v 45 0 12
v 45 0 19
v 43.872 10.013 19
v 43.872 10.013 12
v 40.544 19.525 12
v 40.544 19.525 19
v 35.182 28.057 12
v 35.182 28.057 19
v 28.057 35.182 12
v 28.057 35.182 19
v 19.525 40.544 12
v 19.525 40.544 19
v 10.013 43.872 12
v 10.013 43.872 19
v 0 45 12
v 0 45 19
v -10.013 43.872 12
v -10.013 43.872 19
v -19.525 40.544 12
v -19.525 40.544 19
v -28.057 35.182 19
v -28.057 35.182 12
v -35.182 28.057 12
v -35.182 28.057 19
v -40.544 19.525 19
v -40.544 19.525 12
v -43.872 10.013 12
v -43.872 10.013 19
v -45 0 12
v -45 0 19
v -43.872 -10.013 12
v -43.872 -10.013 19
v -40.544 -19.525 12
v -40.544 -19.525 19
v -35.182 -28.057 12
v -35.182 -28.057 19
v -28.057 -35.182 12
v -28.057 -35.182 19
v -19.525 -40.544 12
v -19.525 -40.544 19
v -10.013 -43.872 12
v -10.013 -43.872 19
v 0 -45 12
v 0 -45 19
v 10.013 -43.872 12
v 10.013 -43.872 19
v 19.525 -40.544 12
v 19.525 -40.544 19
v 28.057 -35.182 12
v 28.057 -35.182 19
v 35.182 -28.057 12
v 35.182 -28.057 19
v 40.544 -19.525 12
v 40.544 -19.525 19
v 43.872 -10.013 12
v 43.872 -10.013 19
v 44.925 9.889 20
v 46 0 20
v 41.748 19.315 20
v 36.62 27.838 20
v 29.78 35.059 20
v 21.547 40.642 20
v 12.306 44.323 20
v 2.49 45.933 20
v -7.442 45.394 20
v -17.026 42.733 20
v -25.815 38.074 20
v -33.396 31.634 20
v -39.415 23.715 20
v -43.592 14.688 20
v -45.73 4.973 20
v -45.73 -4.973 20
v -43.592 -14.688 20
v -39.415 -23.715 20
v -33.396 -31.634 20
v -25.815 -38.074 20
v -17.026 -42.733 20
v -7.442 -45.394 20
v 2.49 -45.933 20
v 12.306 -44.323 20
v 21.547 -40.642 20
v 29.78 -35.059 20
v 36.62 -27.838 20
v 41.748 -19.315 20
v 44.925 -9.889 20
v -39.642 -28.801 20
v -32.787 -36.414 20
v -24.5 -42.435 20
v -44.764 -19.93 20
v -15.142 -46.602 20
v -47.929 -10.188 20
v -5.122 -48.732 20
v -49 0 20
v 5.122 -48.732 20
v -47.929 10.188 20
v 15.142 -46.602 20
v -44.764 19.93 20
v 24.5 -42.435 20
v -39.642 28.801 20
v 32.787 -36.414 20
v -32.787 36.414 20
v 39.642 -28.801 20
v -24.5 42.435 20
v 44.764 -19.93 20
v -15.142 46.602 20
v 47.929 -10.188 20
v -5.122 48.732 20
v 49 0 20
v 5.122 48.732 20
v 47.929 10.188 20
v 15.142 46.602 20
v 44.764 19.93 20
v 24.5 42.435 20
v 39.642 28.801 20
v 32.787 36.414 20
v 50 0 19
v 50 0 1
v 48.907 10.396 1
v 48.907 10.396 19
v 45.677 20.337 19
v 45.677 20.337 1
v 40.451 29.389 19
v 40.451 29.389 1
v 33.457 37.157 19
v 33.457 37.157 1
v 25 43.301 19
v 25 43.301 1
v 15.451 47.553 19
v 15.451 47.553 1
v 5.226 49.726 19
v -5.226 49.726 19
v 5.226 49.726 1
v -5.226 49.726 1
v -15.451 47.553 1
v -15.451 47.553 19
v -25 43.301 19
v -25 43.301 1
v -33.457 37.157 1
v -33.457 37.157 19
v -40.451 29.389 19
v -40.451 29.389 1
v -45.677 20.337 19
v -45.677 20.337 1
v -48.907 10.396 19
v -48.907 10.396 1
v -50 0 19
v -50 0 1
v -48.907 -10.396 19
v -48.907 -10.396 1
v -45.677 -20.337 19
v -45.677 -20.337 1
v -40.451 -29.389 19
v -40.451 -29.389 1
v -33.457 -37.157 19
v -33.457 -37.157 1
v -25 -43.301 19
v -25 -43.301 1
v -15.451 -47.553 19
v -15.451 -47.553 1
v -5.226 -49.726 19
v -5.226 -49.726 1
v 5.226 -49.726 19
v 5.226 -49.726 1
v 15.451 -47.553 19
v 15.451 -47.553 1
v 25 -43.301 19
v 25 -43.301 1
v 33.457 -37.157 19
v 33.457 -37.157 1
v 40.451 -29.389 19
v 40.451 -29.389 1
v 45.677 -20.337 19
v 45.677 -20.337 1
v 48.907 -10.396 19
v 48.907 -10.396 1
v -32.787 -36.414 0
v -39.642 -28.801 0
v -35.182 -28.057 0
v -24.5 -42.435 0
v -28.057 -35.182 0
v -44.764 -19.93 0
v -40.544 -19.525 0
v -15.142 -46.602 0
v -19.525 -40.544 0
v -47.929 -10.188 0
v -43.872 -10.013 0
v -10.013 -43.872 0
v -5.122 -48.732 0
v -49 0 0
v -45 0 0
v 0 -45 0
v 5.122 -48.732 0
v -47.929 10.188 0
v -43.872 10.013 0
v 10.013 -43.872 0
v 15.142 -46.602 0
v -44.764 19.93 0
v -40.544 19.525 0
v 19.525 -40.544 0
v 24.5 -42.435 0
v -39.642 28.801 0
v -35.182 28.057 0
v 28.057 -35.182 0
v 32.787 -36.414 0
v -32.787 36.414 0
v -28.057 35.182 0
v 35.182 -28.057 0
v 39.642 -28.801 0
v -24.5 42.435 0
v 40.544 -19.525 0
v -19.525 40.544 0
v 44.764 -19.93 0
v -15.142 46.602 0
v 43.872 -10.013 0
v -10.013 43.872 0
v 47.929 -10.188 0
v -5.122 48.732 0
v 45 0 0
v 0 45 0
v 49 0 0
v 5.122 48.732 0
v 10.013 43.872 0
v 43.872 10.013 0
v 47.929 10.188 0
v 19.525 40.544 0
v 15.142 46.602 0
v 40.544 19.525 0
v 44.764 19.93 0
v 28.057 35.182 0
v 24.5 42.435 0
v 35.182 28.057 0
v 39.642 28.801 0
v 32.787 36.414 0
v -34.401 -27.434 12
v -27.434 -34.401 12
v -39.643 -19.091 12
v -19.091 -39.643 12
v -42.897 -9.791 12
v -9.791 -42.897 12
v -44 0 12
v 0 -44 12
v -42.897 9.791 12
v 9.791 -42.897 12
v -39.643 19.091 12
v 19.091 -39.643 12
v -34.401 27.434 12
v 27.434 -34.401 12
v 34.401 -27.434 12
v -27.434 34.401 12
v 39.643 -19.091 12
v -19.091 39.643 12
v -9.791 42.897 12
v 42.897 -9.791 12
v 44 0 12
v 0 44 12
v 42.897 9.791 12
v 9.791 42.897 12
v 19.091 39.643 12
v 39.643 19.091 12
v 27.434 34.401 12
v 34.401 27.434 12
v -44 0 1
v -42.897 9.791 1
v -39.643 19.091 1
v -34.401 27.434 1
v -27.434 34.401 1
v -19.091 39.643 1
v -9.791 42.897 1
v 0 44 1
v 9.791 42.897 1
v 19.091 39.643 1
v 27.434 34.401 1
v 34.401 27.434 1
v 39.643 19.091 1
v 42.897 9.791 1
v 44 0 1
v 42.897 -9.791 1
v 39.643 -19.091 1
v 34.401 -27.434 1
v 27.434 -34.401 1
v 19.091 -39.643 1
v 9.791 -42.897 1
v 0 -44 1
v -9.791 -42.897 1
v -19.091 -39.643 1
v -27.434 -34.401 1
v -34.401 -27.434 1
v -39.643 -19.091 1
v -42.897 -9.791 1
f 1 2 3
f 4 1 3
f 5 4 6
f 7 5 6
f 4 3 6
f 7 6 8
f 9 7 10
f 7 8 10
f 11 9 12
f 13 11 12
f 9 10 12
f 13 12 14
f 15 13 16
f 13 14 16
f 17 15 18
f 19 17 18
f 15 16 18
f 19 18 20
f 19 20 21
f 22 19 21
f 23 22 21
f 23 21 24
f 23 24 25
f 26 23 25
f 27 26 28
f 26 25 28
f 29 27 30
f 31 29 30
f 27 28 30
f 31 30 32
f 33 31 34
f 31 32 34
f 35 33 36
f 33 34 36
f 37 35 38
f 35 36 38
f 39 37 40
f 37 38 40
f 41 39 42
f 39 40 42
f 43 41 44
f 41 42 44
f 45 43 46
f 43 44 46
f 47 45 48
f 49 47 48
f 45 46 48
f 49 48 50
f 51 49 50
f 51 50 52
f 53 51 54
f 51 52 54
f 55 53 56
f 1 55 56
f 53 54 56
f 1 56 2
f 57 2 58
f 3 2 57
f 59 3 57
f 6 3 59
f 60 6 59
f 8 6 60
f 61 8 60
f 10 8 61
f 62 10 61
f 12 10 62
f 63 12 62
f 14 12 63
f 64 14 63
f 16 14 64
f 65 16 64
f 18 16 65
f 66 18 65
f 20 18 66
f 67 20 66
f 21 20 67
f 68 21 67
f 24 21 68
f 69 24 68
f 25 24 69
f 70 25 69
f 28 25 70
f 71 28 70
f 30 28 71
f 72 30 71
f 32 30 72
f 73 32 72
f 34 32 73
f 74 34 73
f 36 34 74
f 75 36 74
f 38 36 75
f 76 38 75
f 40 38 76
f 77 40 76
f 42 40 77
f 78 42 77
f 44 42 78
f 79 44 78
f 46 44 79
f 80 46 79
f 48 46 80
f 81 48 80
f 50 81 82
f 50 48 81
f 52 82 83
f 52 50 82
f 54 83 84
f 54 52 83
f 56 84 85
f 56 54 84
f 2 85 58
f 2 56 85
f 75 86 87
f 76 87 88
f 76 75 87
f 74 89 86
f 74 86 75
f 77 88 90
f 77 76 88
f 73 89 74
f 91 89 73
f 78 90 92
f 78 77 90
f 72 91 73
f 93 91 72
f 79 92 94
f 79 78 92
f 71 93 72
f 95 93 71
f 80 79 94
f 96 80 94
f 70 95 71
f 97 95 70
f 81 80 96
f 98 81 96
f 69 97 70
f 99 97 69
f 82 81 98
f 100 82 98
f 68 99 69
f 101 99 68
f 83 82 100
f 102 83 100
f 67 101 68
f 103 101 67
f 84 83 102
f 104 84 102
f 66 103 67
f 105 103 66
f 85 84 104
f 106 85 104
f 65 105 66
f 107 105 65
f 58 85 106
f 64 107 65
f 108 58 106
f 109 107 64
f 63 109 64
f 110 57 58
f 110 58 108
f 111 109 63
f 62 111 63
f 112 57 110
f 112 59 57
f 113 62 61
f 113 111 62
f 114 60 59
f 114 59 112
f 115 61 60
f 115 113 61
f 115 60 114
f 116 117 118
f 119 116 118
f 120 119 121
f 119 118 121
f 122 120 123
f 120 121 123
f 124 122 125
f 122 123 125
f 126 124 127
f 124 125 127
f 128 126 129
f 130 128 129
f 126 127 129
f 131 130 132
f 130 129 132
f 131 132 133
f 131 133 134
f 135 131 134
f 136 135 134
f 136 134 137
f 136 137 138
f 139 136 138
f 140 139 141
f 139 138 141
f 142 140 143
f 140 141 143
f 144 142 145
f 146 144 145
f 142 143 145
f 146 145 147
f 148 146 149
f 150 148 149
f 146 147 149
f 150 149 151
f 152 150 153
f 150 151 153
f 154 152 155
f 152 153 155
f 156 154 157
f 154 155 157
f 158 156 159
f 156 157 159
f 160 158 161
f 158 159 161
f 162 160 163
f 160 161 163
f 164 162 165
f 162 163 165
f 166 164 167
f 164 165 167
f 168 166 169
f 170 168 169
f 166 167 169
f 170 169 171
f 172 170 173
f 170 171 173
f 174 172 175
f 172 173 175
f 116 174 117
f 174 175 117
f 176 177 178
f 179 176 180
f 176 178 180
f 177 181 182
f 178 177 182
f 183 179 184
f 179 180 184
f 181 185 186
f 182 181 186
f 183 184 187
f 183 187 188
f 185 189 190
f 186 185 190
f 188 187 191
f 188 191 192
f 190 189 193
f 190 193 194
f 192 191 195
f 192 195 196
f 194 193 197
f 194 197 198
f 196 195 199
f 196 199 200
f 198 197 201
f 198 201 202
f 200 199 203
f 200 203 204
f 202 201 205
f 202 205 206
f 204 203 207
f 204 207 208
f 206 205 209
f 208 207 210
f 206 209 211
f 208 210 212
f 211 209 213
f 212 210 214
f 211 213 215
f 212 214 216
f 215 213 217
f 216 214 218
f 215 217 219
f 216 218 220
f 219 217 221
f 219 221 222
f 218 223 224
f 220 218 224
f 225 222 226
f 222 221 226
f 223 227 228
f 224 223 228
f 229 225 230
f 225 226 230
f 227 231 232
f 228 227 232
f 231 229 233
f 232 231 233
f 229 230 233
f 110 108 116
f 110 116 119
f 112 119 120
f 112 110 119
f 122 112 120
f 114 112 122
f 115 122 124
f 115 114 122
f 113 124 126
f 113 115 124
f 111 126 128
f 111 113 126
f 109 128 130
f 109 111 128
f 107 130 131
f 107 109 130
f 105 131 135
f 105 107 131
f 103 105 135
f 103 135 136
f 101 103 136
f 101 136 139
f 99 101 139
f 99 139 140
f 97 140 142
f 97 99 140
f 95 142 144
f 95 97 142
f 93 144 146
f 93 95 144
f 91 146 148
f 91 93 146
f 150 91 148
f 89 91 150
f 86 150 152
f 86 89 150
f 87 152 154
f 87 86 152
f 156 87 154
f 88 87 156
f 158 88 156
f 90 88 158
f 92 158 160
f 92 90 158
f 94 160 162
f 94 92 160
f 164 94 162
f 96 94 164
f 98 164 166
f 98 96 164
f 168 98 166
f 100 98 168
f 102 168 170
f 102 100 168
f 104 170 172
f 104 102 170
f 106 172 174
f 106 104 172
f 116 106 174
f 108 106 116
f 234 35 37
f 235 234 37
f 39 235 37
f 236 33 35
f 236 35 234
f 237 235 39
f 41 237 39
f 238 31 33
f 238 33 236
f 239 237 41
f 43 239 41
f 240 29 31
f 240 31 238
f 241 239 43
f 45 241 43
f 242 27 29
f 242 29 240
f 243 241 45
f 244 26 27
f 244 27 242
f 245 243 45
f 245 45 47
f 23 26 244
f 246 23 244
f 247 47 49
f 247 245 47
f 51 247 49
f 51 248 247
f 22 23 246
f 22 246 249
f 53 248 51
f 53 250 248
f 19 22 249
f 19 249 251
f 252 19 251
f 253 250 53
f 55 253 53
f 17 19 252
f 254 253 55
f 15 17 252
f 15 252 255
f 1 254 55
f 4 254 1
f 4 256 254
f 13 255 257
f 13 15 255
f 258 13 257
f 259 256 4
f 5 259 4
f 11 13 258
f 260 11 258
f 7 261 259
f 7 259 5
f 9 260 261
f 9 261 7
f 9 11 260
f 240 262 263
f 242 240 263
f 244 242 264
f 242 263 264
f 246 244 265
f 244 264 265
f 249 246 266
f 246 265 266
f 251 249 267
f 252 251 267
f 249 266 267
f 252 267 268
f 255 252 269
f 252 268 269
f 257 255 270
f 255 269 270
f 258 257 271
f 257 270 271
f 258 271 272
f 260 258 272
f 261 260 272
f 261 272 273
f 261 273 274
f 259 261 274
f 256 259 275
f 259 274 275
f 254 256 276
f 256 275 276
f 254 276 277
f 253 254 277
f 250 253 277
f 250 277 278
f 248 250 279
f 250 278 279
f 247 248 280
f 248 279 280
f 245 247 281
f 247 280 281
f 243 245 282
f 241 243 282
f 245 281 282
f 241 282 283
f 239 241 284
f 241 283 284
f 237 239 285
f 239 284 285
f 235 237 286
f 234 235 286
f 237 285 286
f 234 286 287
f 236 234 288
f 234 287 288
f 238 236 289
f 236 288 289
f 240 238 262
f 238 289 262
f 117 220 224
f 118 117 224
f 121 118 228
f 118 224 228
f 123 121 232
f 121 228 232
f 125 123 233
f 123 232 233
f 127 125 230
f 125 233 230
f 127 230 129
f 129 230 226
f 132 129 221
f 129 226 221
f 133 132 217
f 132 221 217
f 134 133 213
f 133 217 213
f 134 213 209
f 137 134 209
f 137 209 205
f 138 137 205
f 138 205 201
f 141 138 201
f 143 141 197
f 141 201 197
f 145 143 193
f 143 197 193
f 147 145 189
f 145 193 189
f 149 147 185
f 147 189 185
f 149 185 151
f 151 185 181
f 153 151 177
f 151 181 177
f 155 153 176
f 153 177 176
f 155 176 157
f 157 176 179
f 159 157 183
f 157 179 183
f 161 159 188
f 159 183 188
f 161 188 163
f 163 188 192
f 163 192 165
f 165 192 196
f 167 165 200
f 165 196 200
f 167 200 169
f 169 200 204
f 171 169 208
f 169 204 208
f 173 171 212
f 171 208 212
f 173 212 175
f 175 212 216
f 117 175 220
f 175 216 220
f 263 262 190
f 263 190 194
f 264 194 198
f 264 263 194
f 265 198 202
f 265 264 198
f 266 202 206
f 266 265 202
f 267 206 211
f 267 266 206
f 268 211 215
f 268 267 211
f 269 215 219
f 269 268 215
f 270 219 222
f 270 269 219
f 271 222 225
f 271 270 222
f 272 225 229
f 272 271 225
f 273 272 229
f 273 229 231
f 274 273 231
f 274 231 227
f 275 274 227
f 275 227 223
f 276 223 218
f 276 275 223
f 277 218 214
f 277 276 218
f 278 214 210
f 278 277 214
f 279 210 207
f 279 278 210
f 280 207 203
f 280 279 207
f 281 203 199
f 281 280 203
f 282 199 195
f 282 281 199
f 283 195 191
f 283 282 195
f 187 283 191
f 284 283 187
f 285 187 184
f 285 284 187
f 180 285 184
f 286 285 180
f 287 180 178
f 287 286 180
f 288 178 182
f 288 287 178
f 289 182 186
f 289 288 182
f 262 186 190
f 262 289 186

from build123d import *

# Parameters (mm, degrees)
SKETCH_1_R          = 50
EXTRUDE_1_DEPTH     = 20
SKETCH_2_R          = 45
CUT_EXTRUDE_1_DEPTH = 8
SKETCH_3_R          = 44
CUT_EXTRUDE_2_DEPTH = 12
CHAMFER_1_SIZE      = 1


with BuildPart() as part:
    # 스케치1 → 보스-돌출1 (new body)
    with BuildSketch(Plane.XY):
        Circle(SKETCH_1_R)
    extrude(amount=EXTRUDE_1_DEPTH)

    # 스케치2 → 컷-돌출1 (cut)
    with BuildSketch(Plane.XY.offset(20)):
        Circle(SKETCH_2_R)
    extrude(amount=-CUT_EXTRUDE_1_DEPTH, mode=Mode.SUBTRACT)

    # 스케치3 → 컷-돌출2 (cut)
    with BuildSketch(Plane(origin=(0, 0, 0), x_dir=(-1, 0, 0), z_dir=(0, 0, -1))):
        Circle(SKETCH_3_R)
    extrude(amount=-CUT_EXTRUDE_2_DEPTH, mode=Mode.SUBTRACT)

    # 모따기1
    chamfer_1_edges = [part.edges().sort_by_distance(p)[0] for p in [
        (44, 0, 0),
        (-50, 0, 0),
        (-50, 0, 20),
        (-45, 0, 20),
    ]]
    chamfer(chamfer_1_edges, length=CHAMFER_1_SIZE)


solid = part.part
